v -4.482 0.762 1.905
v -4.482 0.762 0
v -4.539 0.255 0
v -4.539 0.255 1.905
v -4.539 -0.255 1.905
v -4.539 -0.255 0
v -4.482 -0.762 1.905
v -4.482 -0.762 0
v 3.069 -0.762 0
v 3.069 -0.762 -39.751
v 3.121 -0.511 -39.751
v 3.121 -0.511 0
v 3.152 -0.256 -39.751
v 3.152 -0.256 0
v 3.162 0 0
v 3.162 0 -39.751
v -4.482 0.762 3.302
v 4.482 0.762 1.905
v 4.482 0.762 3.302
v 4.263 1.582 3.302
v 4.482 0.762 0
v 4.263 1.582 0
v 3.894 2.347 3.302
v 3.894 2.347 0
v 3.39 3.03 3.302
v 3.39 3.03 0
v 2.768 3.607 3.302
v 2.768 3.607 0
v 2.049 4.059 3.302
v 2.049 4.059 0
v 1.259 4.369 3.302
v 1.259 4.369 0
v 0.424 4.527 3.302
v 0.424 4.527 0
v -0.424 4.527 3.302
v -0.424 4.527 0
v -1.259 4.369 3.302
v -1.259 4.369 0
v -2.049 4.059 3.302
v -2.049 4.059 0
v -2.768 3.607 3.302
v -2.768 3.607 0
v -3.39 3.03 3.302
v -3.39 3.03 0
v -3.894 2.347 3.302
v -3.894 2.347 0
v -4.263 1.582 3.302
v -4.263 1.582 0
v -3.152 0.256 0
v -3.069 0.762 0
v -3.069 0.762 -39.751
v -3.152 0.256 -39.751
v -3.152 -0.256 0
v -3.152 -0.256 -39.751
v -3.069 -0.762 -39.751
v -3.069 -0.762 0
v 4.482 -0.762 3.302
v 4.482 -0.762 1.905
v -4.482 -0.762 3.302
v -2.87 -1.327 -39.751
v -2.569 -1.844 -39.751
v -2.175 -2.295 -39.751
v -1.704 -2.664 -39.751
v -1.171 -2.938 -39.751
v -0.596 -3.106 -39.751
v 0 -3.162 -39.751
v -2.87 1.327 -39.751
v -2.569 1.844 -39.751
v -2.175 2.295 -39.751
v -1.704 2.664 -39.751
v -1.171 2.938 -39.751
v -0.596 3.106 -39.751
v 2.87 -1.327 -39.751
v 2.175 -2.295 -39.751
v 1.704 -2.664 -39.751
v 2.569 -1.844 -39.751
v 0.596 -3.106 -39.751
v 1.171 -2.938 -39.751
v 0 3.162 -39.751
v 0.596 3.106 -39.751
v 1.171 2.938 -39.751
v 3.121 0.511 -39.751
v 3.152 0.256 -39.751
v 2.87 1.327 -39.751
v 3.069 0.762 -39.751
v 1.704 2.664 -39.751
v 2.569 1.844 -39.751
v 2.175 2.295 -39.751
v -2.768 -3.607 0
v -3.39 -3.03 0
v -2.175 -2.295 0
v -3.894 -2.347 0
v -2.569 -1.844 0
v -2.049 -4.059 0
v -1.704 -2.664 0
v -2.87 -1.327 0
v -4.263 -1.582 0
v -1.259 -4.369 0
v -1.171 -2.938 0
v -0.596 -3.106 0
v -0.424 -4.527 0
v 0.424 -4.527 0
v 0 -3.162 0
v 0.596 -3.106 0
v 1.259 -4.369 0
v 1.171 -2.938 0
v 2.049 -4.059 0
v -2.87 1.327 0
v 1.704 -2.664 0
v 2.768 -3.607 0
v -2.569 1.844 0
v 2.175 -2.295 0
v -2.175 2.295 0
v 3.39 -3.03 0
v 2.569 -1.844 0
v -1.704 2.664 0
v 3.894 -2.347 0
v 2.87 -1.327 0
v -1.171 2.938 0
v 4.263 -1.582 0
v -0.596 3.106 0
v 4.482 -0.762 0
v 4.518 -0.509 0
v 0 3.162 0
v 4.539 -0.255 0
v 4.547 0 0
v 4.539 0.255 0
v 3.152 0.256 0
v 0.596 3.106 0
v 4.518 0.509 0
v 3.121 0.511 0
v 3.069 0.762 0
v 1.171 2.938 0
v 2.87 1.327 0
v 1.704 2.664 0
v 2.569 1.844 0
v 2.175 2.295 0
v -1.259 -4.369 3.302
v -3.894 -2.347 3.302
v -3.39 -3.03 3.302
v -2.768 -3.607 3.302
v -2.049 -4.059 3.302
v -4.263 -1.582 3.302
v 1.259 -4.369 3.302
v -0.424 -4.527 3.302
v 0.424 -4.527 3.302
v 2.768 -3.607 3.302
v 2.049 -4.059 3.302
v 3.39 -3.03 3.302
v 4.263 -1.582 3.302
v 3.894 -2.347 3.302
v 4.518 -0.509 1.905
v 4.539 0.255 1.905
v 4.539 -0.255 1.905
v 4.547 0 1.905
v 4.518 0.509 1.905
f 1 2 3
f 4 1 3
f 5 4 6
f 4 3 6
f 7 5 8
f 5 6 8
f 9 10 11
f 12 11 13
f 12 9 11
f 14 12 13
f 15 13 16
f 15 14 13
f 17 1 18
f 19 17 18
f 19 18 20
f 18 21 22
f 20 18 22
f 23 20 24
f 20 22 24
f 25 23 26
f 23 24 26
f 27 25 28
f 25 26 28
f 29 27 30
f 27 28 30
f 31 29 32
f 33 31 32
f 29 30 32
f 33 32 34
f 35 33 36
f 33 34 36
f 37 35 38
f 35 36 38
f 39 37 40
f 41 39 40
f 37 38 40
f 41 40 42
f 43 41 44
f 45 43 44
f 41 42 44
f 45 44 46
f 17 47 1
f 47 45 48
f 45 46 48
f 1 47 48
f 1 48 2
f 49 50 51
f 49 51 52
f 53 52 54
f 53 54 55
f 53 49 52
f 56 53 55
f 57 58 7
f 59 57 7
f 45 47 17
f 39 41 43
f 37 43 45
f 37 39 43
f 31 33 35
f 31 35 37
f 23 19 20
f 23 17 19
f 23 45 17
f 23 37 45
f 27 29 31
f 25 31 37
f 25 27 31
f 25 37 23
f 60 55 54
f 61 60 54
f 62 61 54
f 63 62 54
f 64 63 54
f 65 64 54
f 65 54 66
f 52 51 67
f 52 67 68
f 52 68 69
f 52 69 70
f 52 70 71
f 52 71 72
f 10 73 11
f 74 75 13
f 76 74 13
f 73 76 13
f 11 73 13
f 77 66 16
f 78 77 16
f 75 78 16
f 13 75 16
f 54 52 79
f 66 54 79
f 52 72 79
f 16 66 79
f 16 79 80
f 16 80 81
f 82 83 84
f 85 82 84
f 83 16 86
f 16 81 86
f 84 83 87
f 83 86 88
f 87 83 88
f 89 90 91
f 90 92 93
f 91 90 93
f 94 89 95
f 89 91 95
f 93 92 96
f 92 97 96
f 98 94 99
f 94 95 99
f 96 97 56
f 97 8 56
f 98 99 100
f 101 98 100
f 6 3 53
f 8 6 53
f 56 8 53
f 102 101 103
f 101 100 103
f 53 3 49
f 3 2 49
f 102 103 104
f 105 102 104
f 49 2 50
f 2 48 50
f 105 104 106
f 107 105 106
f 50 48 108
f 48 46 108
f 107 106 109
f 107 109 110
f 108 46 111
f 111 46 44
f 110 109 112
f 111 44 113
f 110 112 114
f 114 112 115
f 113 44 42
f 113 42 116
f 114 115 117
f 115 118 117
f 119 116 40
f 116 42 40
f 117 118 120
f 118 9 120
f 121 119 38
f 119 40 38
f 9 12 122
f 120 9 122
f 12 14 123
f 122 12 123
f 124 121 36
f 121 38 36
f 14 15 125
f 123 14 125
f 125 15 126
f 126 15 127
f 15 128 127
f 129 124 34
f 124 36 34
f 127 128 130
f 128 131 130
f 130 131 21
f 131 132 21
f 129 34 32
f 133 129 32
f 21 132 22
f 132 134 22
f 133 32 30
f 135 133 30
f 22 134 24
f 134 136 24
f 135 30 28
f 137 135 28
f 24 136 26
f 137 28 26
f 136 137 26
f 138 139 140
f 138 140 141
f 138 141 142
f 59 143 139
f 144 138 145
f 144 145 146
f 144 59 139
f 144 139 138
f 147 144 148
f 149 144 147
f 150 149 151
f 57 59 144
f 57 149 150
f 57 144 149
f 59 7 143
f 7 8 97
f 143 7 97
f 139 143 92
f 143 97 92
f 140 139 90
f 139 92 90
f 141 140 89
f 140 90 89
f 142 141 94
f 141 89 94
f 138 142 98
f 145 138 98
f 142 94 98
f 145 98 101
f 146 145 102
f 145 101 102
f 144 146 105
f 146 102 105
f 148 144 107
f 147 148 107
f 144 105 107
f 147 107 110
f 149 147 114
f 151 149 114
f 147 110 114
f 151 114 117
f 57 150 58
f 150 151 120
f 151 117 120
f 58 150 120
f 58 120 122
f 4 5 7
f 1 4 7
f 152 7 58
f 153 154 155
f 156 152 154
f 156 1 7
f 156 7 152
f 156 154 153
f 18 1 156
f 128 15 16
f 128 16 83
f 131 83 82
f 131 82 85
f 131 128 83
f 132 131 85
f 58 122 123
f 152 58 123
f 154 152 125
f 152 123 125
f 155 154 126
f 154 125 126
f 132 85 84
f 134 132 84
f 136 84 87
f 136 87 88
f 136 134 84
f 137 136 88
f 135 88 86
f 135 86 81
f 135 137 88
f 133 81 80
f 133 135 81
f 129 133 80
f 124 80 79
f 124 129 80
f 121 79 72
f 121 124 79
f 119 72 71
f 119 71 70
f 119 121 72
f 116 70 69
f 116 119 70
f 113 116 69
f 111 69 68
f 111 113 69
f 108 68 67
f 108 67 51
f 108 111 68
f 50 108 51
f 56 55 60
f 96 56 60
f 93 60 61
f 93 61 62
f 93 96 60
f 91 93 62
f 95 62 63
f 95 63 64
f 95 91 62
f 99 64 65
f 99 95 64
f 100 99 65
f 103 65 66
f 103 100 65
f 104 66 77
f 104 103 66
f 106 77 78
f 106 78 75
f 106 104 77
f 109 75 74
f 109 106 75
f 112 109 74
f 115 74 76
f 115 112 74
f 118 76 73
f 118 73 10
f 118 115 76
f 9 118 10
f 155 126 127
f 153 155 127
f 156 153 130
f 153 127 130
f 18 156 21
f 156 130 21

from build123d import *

# Parameters (mm, degrees)
F1_DEPTH = 3.302
F2_DEPTH = 1.905
F3_DEPTH = 39.751


with BuildPart() as f1:
    # F0 (on Top) → F1 (new body)
    with BuildSketch(Plane.XY):
        with BuildLine():
            Line((3.0691199537, 0.762), (4.4822904368, 0.762))
            ThreePointArc((4.4822904368, 0.762), (0, 4.5466), (-4.4822904368, 0.762))
            Line((-4.4822904368, 0.762), (-3.0691199537, 0.762))
            ThreePointArc((-3.0691199537, 0.762), (0, 3.1623), (3.0691199537, 0.762))
        make_face()
        with BuildLine():
            Line((-3.0691199537, 0.762), (3.0691199537, 0.762))
            ThreePointArc((3.0691199537, 0.762), (0, 3.1623), (-3.0691199537, 0.762))
        make_face()
    extrude(amount=F1_DEPTH)



with BuildPart() as f1b:
    # F0 (on Top) → F1, piece 2 (new body)
    with BuildSketch(Plane.XY):
        with BuildLine():
            Line((3.0691199537, -0.762), (-3.0691199537, -0.762))
            ThreePointArc((-3.0691199537, -0.762), (0, -3.1623), (3.0691199537, -0.762))
        make_face()
        with BuildLine():
            ThreePointArc((-4.4822904368, -0.762), (0, -4.5466), (4.4822904368, -0.762))
            Line((4.4822904368, -0.762), (3.0691199537, -0.762))
            ThreePointArc((3.0691199537, -0.762), (0, -3.1623), (-3.0691199537, -0.762))
            Line((-3.0691199537, -0.762), (-4.4822904368, -0.762))
        make_face()
    extrude(amount=F1_DEPTH)


with BuildPart() as f1_1:
    add(f1.part)

    add(f1b.part)  # F2 merges F1b
    # F0 (on Top) → F2 (join)
    with BuildSketch(Plane.XY):
        with BuildLine():
            ThreePointArc((3.1623, 0), (3.1389185494, 0.3838380261), (3.0691199537, 0.762))
            Line((3.0691199537, 0.762), (-3.0691199537, 0.762))
            ThreePointArc((-3.0691199537, 0.762), (-3.1623, 0), (-3.0691199537, -0.762))
            Line((-3.0691199537, -0.762), (3.0691199537, -0.762))
            ThreePointArc((3.0691199537, -0.762), (3.1389185494, -0.3838380261), (3.1623, 0))
        make_face()
        with BuildLine():
            ThreePointArc((4.5466, 0), (4.5304940823, 0.3823544559), (4.4822904368, 0.762))
            Line((4.4822904368, 0.762), (3.0691199537, 0.762))
            ThreePointArc((3.0691199537, 0.762), (3.1389185494, 0.3838380261), (3.1623, 0))
            ThreePointArc((3.1623, 0), (3.1389185494, -0.3838380261), (3.0691199537, -0.762))
            Line((3.0691199537, -0.762), (4.4822904368, -0.762))
            ThreePointArc((4.4822904368, -0.762), (4.5304940823, -0.3823544559), (4.5466, 0))
        make_face()
        with BuildLine():
            Line((-3.0691199537, 0.762), (-4.4822904368, 0.762))
            ThreePointArc((-4.4822904368, 0.762), (-4.5466, 0), (-4.4822904368, -0.762))
            Line((-4.4822904368, -0.762), (-3.0691199537, -0.762))
            ThreePointArc((-3.0691199537, -0.762), (-3.1623, 0), (-3.0691199537, 0.762))
        make_face()
    extrude(amount=F2_DEPTH)

    # F0 (on Top) → F3 (join)
    with BuildSketch(Plane.XY):
        with BuildLine():
            Line((-3.0691199537, 0.762), (3.0691199537, 0.762))
            ThreePointArc((3.0691199537, 0.762), (0, 3.1623), (-3.0691199537, 0.762))
        make_face()
        with BuildLine():
            ThreePointArc((3.1623, 0), (3.1389185494, 0.3838380261), (3.0691199537, 0.762))
            Line((3.0691199537, 0.762), (-3.0691199537, 0.762))
            ThreePointArc((-3.0691199537, 0.762), (-3.1623, 0), (-3.0691199537, -0.762))
            Line((-3.0691199537, -0.762), (3.0691199537, -0.762))
            ThreePointArc((3.0691199537, -0.762), (3.1389185494, -0.3838380261), (3.1623, 0))
        make_face()
        with BuildLine():
            Line((3.0691199537, -0.762), (-3.0691199537, -0.762))
            ThreePointArc((-3.0691199537, -0.762), (0, -3.1623), (3.0691199537, -0.762))
        make_face()
    extrude(amount=-F3_DEPTH)


solid = f1_1.part
